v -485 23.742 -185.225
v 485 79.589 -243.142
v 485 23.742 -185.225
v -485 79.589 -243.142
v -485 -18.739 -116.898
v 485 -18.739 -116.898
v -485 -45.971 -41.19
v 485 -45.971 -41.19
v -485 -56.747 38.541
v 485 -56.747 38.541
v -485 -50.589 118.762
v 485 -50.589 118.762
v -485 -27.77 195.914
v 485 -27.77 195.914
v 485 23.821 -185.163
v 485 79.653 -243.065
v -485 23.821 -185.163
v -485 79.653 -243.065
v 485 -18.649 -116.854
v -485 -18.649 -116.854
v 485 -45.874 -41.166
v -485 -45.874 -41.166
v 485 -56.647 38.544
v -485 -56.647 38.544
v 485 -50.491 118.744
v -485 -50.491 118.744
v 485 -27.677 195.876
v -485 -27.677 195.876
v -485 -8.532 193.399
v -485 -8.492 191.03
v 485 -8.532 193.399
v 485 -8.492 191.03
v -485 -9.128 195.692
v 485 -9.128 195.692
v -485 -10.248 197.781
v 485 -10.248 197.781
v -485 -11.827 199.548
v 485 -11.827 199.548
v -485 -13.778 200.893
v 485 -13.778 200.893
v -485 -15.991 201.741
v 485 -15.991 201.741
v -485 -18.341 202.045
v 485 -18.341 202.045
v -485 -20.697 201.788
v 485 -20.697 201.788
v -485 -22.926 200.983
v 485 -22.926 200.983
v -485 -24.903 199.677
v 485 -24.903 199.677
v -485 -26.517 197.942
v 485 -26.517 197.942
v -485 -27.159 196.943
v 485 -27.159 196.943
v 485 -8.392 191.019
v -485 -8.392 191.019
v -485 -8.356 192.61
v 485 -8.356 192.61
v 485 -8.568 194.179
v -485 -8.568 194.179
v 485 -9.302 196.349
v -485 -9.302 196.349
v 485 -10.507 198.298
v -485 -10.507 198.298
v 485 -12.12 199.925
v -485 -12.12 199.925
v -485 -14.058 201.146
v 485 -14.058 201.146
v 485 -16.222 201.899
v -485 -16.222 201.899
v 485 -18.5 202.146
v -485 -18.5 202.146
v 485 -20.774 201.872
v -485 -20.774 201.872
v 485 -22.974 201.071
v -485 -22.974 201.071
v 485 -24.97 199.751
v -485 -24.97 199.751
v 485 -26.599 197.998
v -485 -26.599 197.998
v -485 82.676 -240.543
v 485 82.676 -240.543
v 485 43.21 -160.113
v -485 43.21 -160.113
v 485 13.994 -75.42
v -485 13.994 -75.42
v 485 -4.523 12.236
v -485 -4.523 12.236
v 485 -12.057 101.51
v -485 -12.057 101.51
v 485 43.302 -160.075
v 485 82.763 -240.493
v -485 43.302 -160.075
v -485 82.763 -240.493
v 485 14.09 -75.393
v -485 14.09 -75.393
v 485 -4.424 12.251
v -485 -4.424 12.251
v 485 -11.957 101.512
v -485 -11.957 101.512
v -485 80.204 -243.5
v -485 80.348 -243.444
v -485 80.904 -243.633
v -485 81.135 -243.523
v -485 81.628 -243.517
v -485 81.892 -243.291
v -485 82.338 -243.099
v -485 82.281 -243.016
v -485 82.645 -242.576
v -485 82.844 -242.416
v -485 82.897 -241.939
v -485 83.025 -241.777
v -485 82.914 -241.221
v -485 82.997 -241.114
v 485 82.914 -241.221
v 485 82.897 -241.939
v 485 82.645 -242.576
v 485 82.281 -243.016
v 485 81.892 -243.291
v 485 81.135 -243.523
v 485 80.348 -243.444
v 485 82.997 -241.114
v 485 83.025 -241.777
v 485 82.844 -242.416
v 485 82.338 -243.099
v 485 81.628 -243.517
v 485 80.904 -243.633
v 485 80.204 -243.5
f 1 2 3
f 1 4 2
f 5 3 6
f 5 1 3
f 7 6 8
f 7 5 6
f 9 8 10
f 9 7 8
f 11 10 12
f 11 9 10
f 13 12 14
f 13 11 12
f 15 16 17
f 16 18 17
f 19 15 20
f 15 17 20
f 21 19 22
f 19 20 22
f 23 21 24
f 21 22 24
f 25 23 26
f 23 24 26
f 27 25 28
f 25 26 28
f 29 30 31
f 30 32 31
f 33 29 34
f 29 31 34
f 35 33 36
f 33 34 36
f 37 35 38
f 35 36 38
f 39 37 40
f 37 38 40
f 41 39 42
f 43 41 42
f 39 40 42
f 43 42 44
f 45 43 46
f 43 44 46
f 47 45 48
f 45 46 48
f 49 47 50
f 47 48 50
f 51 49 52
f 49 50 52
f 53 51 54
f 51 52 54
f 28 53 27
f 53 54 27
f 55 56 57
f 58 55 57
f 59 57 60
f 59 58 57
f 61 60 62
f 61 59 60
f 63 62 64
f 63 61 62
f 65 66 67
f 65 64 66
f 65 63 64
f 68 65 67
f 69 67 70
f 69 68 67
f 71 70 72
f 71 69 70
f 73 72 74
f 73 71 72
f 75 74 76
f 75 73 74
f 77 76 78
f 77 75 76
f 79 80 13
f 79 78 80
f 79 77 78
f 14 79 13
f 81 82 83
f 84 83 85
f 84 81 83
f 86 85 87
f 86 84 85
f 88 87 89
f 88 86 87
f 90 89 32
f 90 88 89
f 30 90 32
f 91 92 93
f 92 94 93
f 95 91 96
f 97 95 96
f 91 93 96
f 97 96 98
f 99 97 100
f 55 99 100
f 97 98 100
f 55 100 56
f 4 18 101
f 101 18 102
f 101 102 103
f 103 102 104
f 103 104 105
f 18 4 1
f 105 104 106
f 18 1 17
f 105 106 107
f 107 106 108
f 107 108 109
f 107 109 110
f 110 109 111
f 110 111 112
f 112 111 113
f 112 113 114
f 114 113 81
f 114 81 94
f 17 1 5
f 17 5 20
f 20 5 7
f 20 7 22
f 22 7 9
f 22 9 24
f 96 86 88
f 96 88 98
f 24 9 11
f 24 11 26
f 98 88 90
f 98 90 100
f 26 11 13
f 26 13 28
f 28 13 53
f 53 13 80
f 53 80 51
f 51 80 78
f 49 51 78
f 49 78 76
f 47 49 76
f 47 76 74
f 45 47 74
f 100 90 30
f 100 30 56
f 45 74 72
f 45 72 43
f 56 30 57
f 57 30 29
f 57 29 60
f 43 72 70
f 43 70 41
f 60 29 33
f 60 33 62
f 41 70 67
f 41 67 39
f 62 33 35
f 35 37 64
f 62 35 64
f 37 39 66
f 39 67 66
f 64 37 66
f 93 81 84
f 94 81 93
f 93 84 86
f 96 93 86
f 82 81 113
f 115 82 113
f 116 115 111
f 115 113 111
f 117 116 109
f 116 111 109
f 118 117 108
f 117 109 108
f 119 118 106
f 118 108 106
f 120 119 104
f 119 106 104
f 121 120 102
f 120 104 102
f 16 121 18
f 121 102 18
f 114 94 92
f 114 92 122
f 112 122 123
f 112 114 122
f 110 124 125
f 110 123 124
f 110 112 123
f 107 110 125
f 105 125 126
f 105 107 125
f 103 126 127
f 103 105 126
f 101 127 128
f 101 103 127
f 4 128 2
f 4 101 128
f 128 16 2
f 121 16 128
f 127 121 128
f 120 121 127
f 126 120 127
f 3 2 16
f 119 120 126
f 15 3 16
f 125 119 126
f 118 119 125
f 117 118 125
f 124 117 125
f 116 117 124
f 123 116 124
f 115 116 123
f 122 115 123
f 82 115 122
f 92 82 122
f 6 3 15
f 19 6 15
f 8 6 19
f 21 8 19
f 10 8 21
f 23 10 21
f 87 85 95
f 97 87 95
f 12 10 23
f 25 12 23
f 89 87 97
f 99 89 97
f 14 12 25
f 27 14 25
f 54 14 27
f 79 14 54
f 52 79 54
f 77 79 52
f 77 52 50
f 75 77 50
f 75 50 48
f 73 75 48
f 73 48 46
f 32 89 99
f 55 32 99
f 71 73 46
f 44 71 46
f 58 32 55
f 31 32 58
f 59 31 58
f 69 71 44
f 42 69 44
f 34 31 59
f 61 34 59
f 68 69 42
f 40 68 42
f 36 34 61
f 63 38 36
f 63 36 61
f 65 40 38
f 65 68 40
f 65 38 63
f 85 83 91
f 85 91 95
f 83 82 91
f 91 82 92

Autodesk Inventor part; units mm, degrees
ref_plane "YZ Plane" through (0, 0, 0) normal (1, 0, 0) x (0, 1, 0)
ref_plane "XZ Plane" through (0, 0, 0) normal (0, 1, 0) x (-1, 0, 0)
ref_plane "XY Plane" through (0, 0, 0) normal (0, 0, 1) x (1, 0, 0)
sketch "スケッチ1" plane through (0, 0, 0) normal (1, 0, 0) x (0, 1, 0)
  line L0 (0, 250) -> (88.1635, -250)
  arc A0 (0, 250) -> (88.1635, -250) centre (710.7652, 117.5543) ccw
  arc A1 (0, 250) -> (88.1635, -250) centre (325.1936, 49.5676) ccw
  line L1 (0, -370.1192) -> (0, 353.3532) projected
  point P0 (0, 0)
  dimension "d0" = 250
  dimension "d2" = 500
  dimension "d3" = 10
  dimension "d4" = 723
  dimension "d5" = 382
extrude "押し出し1" add sketch "スケッチ1" along normal mid plane 970 contours A0 L1 A1 | A1 L1 A0
fillet "フィレット1" radius 10 1 edges at (0, 0, 250)
fillet "フィレット2" radius 2 1 edges at (0, 88.1635, -250)
shell "シェル1" thickness 0.1 outward yes removed faces 2 at (485, -17.1174, -13.9662) at (-485, -17.1174, -13.9662)
properties part number "cover" material "CFRP"
